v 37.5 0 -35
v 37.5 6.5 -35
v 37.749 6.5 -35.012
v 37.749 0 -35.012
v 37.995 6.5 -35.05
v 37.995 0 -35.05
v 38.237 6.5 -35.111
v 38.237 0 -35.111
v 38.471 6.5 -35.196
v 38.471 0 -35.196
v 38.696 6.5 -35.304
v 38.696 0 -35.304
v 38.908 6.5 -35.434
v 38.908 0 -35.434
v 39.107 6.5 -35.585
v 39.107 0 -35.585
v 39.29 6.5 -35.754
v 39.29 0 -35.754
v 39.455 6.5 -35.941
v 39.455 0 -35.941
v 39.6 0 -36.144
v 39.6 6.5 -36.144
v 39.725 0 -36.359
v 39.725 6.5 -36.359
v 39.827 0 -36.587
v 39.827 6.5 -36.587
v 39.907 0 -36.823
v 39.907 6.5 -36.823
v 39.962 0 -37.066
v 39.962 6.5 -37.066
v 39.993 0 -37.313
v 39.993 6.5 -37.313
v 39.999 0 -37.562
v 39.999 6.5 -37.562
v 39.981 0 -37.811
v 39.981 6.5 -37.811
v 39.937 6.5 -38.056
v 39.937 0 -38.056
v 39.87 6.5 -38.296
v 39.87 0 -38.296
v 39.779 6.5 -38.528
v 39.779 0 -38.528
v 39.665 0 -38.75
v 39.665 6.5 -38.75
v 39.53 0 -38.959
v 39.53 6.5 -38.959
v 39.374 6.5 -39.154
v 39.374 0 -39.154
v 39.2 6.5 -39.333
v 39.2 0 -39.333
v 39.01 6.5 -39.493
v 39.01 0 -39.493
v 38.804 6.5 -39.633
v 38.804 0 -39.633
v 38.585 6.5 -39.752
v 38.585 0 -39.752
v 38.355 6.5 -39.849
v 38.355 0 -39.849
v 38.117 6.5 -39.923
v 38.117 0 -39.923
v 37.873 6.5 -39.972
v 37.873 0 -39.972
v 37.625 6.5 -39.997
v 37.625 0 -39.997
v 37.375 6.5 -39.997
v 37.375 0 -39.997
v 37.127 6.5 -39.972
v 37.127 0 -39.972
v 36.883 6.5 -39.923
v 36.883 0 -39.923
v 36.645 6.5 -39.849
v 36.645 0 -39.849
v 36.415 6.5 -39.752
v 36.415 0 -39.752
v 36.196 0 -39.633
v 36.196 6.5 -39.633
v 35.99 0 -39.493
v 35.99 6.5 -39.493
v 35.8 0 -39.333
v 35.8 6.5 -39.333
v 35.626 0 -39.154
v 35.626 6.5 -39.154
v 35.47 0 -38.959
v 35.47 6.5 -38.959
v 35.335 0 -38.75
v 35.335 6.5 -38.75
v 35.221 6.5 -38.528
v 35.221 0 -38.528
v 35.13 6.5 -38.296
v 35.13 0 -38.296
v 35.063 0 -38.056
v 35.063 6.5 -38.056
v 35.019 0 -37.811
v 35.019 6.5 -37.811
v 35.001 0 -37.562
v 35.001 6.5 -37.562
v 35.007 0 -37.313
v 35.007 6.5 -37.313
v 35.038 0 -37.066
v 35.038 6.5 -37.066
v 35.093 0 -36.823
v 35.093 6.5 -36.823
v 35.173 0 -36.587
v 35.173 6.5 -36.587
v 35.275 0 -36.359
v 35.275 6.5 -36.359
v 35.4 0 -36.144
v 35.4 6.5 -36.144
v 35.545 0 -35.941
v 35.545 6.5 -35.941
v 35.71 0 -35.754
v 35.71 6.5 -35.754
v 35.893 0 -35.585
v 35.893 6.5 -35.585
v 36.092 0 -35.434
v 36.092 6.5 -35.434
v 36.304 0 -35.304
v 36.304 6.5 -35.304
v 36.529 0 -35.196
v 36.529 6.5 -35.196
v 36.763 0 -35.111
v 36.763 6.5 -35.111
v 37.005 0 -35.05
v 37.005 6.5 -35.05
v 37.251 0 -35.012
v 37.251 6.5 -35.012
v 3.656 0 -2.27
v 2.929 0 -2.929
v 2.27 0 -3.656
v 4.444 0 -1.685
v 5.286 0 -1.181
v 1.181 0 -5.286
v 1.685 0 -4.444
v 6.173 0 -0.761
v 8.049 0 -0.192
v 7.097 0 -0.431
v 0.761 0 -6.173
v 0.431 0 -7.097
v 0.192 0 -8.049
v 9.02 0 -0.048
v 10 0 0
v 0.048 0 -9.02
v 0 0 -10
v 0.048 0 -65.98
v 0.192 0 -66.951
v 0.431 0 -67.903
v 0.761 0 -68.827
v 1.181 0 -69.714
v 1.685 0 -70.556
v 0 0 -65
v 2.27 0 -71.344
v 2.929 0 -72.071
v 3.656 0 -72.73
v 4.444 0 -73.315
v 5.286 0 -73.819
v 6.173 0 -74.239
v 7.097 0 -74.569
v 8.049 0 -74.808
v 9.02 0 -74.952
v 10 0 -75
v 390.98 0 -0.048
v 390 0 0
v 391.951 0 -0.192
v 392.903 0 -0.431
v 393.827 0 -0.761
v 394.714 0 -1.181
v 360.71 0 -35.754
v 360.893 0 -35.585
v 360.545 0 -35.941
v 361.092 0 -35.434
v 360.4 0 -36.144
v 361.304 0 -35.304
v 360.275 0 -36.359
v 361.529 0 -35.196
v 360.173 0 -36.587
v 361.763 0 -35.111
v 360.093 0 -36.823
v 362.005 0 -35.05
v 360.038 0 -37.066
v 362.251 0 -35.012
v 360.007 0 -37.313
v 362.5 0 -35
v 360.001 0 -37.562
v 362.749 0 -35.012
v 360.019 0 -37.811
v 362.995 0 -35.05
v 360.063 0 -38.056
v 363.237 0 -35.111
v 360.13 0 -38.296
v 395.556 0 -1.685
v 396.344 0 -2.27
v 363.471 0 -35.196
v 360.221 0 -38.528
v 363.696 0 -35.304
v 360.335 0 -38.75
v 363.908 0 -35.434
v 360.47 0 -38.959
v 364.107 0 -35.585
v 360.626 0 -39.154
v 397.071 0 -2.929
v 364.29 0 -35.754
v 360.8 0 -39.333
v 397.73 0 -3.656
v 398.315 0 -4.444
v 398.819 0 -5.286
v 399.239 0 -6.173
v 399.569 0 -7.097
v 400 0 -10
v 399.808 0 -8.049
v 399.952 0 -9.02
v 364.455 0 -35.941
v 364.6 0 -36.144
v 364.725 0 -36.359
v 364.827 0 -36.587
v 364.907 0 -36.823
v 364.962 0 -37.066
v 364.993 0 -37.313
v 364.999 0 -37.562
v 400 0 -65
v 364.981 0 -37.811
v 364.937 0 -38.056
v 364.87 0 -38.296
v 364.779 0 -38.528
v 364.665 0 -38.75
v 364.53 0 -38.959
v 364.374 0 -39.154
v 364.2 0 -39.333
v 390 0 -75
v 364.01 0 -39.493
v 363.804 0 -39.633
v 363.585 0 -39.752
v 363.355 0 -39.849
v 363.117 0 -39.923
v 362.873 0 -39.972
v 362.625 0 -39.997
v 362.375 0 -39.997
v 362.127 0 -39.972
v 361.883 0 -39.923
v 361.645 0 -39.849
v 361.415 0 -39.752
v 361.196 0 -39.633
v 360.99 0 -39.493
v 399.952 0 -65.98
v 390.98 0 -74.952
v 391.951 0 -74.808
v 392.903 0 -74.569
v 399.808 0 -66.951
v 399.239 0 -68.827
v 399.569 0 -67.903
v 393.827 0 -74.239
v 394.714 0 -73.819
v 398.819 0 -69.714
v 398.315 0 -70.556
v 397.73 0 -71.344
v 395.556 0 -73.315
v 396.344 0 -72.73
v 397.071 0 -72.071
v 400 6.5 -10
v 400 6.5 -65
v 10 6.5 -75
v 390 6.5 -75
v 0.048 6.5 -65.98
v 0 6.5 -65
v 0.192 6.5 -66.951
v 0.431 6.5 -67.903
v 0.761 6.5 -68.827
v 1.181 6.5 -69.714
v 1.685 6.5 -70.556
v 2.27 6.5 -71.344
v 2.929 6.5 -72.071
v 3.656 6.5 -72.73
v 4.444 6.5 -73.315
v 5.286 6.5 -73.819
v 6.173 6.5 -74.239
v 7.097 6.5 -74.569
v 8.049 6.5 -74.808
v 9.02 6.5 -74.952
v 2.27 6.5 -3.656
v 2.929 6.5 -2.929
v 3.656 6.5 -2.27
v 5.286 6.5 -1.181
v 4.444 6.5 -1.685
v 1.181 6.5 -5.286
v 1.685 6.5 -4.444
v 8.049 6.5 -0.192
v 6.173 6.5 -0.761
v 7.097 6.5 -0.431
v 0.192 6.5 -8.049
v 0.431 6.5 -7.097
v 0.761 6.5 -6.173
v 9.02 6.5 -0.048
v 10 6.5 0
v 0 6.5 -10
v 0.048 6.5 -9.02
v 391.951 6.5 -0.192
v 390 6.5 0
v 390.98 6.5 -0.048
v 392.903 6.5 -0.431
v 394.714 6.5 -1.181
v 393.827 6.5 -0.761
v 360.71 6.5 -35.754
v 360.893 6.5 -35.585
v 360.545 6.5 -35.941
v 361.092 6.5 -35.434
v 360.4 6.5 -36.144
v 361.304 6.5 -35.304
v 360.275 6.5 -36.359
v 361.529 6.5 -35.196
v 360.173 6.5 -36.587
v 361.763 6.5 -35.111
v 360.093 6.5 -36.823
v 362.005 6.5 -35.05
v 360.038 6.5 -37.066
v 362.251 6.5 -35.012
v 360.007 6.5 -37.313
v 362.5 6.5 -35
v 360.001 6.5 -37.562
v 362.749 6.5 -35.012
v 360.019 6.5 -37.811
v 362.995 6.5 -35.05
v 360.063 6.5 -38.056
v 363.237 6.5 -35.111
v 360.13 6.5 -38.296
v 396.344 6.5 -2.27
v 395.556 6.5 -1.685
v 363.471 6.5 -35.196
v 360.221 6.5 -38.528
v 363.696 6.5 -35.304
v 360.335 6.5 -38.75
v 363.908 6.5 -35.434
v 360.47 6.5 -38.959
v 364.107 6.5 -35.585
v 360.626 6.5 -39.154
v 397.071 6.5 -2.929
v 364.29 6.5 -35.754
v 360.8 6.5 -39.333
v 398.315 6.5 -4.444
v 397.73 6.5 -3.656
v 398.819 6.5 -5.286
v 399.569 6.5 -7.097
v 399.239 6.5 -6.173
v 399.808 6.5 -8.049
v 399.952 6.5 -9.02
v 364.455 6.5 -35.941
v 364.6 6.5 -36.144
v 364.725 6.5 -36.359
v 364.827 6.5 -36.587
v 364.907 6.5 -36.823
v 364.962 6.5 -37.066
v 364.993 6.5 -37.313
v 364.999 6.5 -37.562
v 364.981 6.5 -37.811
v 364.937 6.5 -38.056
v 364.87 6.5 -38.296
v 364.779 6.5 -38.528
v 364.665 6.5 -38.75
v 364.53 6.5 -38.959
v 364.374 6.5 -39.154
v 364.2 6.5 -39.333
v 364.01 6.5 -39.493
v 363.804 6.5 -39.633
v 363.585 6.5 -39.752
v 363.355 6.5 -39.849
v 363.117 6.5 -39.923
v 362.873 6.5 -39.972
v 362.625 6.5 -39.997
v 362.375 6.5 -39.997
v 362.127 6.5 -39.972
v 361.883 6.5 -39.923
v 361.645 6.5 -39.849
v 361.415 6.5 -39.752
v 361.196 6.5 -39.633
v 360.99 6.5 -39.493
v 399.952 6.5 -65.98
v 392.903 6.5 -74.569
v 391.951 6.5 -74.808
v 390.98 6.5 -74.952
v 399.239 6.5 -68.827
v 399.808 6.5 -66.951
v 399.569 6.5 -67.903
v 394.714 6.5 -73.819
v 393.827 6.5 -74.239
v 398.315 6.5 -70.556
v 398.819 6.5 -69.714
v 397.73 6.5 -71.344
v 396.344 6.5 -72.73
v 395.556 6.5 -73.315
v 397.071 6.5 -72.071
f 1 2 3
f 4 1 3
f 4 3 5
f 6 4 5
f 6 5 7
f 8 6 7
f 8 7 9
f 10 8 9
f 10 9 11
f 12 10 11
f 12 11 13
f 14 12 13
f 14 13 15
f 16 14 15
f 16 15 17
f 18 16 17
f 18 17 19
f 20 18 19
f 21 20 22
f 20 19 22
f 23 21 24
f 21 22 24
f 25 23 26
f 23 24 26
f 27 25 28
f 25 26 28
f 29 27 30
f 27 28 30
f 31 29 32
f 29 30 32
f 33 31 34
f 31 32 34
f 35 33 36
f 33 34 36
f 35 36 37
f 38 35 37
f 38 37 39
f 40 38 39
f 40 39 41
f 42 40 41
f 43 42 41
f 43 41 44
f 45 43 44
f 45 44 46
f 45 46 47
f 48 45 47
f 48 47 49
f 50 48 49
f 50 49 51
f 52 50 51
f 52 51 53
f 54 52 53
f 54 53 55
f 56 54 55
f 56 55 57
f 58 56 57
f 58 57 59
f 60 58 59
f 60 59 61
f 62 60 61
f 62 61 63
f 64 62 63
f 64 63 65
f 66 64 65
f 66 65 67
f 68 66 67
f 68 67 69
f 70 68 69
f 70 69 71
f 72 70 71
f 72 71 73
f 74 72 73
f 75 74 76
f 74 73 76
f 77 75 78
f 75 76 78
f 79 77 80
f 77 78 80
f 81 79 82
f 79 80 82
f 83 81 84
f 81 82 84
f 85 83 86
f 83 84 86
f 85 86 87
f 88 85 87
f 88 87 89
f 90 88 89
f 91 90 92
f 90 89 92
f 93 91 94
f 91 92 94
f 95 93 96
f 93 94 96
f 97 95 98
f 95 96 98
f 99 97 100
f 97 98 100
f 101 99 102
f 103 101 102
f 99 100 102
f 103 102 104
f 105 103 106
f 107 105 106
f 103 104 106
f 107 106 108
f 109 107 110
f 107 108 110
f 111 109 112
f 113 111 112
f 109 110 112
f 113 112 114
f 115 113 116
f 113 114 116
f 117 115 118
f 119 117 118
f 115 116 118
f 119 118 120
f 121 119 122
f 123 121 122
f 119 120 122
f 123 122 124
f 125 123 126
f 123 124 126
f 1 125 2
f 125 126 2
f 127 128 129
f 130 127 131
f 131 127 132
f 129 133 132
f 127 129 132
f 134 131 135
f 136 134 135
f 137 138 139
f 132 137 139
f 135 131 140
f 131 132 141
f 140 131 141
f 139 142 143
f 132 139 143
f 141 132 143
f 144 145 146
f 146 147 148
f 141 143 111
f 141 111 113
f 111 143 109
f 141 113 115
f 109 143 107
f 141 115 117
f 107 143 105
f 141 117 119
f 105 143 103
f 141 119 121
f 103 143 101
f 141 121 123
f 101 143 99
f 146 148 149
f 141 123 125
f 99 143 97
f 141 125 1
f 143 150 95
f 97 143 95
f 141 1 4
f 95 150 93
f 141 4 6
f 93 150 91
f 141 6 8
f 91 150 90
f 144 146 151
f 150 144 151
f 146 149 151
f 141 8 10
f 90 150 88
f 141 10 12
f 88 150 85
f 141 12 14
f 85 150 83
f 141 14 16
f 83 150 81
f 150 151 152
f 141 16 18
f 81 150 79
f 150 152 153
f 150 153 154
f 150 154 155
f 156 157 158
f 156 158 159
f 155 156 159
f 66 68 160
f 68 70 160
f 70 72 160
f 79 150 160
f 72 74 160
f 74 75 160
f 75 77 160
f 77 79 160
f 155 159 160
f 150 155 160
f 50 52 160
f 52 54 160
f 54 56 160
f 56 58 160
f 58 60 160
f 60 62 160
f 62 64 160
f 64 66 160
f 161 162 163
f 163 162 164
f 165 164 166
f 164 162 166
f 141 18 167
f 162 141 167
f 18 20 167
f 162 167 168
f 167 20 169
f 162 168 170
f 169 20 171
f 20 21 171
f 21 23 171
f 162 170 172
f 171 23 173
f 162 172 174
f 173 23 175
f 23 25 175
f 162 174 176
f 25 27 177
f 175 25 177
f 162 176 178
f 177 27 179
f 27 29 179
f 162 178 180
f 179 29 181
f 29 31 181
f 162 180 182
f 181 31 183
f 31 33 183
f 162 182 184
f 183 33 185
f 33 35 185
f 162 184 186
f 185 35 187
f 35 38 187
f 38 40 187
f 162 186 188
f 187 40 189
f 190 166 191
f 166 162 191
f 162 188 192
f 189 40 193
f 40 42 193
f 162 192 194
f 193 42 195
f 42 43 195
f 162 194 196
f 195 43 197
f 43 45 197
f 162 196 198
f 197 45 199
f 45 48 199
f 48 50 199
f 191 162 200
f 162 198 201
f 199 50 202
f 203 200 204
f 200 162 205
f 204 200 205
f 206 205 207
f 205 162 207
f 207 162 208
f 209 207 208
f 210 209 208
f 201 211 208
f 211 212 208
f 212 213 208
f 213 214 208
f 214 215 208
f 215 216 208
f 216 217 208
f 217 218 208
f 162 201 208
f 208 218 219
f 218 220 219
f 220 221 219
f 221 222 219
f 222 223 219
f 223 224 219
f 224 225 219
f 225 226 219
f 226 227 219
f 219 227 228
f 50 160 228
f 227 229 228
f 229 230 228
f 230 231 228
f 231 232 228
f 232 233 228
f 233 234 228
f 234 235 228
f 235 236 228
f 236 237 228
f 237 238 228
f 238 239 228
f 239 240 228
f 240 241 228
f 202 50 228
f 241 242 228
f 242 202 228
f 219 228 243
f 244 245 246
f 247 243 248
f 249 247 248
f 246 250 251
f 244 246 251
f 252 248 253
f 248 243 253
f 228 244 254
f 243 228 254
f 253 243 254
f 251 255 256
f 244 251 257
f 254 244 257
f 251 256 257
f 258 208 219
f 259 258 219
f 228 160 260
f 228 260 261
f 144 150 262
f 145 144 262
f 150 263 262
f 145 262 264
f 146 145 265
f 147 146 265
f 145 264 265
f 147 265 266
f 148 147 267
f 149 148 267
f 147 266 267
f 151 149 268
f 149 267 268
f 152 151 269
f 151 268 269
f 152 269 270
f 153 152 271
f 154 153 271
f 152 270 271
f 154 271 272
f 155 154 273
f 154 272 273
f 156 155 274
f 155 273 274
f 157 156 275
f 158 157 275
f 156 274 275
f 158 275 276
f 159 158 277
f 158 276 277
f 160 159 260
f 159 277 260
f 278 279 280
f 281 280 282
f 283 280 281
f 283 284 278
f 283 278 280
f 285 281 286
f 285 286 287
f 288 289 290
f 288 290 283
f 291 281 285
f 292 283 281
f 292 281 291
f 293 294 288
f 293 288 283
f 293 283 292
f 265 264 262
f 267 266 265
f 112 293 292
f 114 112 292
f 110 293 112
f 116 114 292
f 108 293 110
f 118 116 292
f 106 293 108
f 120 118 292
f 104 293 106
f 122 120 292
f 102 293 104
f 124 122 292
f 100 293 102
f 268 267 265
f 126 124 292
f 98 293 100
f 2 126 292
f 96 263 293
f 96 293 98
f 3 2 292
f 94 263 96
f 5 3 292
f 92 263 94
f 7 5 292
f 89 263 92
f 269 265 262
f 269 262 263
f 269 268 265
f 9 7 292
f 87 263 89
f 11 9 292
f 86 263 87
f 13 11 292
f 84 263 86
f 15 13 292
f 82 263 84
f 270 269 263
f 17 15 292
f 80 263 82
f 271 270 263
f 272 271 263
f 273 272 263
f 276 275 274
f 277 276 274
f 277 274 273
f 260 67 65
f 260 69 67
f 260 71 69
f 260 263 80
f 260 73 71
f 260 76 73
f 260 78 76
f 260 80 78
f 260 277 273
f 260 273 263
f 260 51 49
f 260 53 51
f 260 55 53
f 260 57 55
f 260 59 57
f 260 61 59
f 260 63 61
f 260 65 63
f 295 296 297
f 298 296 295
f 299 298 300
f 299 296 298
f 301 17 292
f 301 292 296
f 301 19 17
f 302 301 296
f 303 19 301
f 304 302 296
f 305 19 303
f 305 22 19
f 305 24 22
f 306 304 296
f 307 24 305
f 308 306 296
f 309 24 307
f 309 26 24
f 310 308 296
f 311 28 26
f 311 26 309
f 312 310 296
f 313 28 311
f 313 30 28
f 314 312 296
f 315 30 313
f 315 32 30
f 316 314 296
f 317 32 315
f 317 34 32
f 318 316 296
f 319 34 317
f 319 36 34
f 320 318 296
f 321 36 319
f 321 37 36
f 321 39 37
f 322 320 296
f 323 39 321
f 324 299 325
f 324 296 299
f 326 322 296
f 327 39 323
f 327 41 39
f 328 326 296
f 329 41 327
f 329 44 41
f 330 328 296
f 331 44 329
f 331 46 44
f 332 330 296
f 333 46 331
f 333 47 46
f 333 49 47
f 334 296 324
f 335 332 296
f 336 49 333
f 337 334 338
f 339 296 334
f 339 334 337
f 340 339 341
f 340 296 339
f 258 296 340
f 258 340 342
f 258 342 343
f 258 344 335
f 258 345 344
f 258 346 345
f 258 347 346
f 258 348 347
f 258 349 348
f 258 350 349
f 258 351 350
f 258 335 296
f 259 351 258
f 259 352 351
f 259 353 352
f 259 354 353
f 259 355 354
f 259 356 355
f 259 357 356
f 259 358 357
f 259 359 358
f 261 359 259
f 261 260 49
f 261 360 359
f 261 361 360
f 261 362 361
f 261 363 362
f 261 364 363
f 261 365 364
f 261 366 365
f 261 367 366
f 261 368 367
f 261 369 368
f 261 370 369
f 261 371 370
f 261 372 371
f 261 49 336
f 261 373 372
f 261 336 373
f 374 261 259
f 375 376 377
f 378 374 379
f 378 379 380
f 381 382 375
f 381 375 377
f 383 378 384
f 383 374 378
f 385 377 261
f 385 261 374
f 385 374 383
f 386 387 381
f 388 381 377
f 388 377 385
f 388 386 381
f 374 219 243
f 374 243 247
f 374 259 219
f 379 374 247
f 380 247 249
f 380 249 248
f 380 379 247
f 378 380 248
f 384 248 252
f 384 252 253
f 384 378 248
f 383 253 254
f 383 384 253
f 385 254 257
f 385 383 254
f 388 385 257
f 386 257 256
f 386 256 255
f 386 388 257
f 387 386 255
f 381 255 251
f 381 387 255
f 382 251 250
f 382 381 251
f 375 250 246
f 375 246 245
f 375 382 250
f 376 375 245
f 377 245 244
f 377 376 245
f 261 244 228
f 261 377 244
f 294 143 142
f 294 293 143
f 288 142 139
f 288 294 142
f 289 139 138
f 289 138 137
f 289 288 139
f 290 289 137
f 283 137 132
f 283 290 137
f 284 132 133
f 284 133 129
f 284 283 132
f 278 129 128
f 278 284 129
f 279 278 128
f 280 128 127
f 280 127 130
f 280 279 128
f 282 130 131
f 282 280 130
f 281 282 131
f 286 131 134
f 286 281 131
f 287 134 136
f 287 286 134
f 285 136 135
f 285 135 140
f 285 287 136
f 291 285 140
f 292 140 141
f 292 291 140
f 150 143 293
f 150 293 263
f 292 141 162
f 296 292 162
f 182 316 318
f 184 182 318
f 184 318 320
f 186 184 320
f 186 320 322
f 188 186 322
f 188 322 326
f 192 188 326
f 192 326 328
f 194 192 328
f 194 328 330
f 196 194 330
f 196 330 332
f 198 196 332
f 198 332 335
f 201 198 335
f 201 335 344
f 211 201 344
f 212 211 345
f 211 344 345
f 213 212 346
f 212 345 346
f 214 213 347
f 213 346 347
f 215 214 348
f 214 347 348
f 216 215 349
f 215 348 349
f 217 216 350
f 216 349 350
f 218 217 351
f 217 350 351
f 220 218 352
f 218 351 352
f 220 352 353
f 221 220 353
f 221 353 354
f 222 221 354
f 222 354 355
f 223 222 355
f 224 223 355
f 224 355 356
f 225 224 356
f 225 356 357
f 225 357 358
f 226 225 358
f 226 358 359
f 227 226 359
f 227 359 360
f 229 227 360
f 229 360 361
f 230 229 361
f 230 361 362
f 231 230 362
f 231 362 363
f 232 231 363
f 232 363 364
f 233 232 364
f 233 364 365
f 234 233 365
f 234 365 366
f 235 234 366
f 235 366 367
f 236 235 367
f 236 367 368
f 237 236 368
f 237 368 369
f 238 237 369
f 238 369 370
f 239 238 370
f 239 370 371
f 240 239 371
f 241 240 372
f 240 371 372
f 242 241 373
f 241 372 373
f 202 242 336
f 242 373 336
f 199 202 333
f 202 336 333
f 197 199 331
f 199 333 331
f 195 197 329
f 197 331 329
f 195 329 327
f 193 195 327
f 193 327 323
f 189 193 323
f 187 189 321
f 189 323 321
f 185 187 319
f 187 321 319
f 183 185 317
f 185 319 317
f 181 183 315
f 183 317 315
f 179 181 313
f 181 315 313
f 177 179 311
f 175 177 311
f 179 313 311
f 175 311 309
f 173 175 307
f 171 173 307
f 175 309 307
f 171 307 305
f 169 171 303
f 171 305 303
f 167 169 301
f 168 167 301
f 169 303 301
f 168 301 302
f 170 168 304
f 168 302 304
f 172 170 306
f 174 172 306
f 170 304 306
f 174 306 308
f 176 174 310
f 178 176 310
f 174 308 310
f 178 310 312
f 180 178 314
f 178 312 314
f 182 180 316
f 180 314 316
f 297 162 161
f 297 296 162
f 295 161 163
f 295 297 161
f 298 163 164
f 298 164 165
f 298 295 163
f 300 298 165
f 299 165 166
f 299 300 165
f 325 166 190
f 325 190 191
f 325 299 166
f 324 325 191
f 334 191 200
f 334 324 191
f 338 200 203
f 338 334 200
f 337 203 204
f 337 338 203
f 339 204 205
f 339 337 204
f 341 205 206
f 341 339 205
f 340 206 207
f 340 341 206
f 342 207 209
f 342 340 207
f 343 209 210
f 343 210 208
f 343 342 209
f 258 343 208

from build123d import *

# Parameters (mm, degrees)
SKETCH1_W           = 400
SKETCH1_H           = 75
BOSS_EXTRUDE1_DEPTH = 6.5
FILLET1_R           = 10
CUT_EXTRUDE1_REACH  = 409.022
SKETCH2_R           = 2.5


with BuildPart() as part:
    # Sketch1 → Boss-Extrude1 (new body)
    with BuildSketch(Plane(origin=(0, 0, 0), x_dir=(1, 0, 0), z_dir=(0, 1, 0))):
        with Locations((200, 37.5)):
            Rectangle(SKETCH1_W, SKETCH1_H)
    extrude(amount=BOSS_EXTRUDE1_DEPTH)

    # Fillet1
    fillet1_edges = [part.edges().sort_by_distance(p)[0] for p in [
        (0, 3.25, -75),
        (400, 3.25, -75),
        (400, 3.25, 0),
        (0, 3.25, 0),
    ]]
    fillet(fillet1_edges, radius=FILLET1_R)

    # Sketch2 → Cut-Extrude1 (cut, up to next)
    with BuildSketch(Plane(origin=(0, 6.5, 0), x_dir=(1, 0, 0), z_dir=(0, 1, 0)), mode=Mode.PRIVATE) as cut_extrude1_sk1:
        with Locations(Location((37.5, 37.5, 0), (0, 0, 270))):
            Circle(SKETCH2_R)
    cut_extrude1_tool1 = extrude(cut_extrude1_sk1.sketch, amount=-CUT_EXTRUDE1_REACH, mode=Mode.PRIVATE) & part.part
    # Sketch2 → Cut-Extrude1 (cut, up to next)
    with BuildSketch(Plane(origin=(0, 6.5, 0), x_dir=(1, 0, 0), z_dir=(0, 1, 0)), mode=Mode.PRIVATE) as cut_extrude1_sk2:
        with Locations(Location((362.5, 37.5, 0), (0, 0, 270))):
            Circle(SKETCH2_R)
    cut_extrude1_tool2 = extrude(cut_extrude1_sk2.sketch, amount=-CUT_EXTRUDE1_REACH, mode=Mode.PRIVATE) & part.part
    add(cut_extrude1_tool1.solids().sort_by_distance((37.5, 6.5, -37.5))[0], mode=Mode.SUBTRACT)
    add(cut_extrude1_tool2.solids().sort_by_distance((362.5, 6.5, -37.5))[0], mode=Mode.SUBTRACT)


solid = part.part
